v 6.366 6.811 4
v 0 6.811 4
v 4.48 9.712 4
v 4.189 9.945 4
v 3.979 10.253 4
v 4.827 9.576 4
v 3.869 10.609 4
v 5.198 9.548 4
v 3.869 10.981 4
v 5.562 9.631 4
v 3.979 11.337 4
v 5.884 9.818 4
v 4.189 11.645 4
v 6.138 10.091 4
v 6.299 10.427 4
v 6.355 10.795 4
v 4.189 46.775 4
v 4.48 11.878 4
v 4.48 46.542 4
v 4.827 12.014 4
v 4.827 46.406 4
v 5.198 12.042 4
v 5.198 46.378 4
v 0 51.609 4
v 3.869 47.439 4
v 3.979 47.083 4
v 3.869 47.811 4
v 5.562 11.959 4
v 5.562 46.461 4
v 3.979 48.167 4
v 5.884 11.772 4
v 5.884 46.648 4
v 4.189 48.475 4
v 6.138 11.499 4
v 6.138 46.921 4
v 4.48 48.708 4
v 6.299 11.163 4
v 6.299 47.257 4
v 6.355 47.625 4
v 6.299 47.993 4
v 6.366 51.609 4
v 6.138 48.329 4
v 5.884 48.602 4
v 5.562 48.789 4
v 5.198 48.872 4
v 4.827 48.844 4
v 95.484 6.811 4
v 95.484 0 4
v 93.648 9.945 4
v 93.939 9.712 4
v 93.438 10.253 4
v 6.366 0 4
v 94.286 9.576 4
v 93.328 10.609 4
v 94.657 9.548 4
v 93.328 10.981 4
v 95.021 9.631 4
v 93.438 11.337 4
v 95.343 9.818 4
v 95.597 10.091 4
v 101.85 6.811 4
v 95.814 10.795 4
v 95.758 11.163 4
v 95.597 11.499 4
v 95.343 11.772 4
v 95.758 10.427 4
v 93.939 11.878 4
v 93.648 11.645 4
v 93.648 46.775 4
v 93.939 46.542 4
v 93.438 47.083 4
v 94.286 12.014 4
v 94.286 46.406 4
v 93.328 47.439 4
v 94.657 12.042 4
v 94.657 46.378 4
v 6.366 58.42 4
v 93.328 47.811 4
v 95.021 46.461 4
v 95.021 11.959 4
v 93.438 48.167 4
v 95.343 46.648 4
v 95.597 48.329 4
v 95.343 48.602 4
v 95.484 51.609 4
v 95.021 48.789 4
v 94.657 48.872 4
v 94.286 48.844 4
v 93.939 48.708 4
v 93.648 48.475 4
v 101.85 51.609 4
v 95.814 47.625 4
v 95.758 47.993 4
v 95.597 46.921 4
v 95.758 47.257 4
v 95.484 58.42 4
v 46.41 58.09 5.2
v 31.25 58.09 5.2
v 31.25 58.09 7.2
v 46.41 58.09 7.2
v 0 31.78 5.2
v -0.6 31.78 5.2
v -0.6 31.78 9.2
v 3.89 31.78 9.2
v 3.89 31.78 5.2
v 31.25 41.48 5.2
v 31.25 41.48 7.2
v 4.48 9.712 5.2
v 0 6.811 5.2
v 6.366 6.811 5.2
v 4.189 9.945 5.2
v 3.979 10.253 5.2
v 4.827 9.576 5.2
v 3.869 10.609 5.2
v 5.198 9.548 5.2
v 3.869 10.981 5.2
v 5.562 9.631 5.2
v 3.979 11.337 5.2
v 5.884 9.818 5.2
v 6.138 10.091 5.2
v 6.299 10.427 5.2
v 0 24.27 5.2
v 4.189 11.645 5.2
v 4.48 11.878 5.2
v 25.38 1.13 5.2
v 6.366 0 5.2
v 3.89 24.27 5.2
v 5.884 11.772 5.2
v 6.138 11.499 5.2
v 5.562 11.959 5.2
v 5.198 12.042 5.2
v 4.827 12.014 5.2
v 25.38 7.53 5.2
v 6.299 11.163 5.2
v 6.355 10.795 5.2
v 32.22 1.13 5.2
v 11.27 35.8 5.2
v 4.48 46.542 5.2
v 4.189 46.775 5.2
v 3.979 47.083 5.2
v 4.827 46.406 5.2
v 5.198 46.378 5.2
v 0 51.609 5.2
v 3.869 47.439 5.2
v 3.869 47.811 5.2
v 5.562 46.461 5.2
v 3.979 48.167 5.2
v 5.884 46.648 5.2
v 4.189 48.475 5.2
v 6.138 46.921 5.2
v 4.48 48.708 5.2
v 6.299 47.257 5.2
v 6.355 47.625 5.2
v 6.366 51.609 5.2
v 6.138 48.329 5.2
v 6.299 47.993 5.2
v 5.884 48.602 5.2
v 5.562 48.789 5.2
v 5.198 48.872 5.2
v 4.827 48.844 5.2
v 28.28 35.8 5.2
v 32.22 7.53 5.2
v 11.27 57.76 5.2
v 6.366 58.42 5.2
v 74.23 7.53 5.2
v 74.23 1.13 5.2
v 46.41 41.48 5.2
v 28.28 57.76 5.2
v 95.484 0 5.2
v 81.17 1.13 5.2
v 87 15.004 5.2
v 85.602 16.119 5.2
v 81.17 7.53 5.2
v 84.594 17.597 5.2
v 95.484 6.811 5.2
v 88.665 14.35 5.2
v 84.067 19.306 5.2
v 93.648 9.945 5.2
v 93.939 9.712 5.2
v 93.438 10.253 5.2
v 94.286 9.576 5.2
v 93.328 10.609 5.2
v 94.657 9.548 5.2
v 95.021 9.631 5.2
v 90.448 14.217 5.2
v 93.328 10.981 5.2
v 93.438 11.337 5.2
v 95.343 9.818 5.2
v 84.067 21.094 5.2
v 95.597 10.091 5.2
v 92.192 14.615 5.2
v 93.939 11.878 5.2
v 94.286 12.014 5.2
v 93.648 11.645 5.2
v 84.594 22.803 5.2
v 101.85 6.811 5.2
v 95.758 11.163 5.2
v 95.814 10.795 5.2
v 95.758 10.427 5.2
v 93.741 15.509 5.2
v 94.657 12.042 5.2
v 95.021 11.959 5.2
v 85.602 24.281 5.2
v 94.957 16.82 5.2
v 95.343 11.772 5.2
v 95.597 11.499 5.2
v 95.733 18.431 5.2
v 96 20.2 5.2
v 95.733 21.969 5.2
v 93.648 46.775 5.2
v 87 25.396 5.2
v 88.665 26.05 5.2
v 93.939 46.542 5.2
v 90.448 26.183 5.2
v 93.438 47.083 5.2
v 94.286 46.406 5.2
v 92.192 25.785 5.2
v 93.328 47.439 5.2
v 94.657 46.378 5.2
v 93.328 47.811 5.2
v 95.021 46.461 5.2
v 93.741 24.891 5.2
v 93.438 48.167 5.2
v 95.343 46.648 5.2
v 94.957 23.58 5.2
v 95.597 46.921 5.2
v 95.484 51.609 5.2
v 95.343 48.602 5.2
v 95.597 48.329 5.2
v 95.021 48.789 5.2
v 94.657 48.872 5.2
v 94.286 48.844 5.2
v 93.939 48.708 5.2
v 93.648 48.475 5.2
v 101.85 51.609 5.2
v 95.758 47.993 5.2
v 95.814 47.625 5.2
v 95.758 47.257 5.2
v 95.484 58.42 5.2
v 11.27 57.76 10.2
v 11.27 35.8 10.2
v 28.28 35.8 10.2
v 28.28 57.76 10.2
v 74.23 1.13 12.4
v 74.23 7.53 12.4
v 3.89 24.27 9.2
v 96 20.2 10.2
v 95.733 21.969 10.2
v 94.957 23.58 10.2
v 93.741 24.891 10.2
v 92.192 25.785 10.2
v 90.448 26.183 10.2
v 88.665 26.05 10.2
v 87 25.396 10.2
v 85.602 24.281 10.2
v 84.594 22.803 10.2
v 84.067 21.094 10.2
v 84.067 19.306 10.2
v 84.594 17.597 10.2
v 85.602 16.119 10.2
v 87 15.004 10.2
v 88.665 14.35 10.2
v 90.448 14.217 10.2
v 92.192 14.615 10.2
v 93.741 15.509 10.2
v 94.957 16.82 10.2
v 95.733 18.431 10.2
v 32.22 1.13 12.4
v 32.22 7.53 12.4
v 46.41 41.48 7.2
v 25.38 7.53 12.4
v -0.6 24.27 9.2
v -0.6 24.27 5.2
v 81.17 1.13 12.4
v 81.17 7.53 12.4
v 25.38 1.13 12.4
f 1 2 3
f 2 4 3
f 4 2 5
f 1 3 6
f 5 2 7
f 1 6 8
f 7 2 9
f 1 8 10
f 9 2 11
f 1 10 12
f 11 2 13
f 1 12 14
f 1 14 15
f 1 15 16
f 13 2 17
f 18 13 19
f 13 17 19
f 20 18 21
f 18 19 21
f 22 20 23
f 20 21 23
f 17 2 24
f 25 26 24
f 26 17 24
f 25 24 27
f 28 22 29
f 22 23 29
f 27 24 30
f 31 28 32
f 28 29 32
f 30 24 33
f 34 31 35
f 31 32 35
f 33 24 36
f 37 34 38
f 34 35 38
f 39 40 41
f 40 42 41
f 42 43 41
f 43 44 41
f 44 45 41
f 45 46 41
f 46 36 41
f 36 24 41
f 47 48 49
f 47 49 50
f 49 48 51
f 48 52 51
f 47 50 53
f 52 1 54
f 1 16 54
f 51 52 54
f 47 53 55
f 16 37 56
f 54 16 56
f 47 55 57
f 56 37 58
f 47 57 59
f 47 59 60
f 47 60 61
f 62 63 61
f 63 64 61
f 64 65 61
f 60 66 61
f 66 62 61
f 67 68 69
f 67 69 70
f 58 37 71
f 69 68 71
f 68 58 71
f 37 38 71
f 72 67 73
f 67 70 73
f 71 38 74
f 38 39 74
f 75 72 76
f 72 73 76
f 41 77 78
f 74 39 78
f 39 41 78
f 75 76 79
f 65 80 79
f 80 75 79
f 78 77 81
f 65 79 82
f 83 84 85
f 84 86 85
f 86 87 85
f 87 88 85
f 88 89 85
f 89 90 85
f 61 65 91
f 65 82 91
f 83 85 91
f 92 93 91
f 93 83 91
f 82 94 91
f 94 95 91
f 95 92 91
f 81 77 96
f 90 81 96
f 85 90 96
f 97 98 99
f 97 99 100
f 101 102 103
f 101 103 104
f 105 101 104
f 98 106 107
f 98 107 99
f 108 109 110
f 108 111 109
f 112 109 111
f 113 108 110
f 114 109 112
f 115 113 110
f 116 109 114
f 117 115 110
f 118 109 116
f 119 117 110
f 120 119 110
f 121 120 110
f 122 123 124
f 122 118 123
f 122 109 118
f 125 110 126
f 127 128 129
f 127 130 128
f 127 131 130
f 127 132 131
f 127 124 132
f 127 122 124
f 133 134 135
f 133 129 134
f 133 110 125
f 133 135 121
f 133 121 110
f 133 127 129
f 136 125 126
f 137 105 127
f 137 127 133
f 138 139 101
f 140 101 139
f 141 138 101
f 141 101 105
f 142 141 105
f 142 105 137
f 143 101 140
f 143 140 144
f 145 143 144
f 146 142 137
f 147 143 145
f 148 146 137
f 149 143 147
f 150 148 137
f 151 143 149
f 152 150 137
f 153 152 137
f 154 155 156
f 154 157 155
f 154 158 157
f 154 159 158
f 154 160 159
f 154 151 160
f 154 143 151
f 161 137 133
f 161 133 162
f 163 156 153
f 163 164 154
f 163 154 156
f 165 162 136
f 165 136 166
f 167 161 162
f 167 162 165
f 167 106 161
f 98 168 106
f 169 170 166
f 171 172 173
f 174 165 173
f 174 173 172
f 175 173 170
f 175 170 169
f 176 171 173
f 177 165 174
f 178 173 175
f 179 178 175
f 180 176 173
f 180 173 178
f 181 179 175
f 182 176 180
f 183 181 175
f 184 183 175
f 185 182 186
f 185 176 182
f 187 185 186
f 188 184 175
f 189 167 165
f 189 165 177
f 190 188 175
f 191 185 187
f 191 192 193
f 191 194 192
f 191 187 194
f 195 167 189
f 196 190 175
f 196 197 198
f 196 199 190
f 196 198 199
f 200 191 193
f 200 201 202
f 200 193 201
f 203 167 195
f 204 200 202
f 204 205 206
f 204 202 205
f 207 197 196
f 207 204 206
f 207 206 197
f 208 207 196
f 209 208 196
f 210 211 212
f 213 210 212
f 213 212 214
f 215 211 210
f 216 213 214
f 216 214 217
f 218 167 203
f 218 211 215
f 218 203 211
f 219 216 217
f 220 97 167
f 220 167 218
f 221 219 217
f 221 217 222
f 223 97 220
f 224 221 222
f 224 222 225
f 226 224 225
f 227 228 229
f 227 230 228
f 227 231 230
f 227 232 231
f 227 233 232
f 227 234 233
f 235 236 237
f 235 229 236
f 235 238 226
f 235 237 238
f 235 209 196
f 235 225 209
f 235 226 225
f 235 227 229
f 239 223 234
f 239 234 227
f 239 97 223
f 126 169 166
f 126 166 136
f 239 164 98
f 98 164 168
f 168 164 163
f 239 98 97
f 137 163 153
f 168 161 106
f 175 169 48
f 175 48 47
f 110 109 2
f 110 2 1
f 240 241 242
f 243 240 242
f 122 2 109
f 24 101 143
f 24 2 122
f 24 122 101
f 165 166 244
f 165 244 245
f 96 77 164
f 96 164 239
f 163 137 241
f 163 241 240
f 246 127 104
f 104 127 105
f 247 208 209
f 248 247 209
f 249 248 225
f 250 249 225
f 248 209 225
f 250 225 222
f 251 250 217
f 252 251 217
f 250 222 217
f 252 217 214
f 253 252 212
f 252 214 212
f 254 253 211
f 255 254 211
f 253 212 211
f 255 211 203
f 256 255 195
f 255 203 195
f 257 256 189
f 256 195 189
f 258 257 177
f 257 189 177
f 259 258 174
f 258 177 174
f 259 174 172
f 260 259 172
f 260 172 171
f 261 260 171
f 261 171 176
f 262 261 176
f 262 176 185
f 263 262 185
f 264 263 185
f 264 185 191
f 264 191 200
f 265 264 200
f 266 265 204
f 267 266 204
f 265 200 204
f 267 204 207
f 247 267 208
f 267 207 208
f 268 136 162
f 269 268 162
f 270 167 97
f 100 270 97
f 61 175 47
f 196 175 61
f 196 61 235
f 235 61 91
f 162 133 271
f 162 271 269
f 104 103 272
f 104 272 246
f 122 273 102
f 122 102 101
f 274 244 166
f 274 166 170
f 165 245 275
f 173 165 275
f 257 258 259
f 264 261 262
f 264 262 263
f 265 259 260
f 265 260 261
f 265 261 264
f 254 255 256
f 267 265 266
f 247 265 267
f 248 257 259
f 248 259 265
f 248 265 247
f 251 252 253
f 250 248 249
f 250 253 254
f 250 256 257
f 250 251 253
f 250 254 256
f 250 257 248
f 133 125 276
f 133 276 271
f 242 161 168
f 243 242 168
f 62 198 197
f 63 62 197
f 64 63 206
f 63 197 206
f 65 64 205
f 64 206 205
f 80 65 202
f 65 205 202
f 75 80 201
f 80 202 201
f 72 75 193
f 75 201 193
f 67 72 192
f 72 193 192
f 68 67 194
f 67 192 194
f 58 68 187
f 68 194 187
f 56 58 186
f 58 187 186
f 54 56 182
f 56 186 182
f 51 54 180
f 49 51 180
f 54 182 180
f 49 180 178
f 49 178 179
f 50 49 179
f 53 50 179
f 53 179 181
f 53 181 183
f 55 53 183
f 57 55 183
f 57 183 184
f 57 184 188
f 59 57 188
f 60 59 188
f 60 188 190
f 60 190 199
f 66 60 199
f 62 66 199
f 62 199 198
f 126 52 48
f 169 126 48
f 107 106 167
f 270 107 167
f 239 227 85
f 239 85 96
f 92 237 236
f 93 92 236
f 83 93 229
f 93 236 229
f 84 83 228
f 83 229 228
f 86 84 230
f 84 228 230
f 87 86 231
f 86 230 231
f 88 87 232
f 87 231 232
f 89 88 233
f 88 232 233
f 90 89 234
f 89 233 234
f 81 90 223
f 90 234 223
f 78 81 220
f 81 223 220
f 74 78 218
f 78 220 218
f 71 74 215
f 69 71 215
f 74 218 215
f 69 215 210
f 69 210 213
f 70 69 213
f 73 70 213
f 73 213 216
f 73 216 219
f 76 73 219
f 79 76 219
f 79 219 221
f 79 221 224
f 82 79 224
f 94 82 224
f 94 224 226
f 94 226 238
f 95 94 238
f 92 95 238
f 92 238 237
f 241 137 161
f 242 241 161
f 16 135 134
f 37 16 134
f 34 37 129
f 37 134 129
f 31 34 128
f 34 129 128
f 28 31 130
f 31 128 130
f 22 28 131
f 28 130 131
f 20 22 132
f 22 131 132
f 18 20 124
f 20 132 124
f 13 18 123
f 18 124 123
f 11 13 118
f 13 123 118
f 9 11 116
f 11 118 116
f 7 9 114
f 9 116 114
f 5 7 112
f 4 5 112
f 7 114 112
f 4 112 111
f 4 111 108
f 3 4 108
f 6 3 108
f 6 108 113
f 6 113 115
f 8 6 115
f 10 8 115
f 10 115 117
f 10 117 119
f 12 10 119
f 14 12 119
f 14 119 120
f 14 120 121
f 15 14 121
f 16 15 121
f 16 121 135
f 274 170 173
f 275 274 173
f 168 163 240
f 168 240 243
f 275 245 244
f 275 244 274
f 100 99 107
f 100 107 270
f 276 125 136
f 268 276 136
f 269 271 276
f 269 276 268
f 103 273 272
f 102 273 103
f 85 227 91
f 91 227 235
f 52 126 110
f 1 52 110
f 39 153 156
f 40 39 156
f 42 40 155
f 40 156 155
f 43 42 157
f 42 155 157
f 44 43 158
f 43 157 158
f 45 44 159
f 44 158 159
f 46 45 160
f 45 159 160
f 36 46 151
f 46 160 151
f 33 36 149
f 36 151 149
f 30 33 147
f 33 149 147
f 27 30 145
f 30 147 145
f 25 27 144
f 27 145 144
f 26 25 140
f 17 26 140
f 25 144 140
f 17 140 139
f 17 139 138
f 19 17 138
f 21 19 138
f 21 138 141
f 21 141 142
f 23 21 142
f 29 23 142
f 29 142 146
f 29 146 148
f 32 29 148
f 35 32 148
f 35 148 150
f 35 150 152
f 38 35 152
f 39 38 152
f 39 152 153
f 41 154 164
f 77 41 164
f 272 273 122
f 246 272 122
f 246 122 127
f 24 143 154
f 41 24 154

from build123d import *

# Parameters (mm, degrees)
SKETCH033_W     = 101.85
SKETCH033_H     = 58.42
PAD011_DEPTH    = 1.2
SKETCH034_W     = 6.366
SKETCH034_H     = 6.811
POCKET017_DEPTH = 1.201
SKETCH035_R     = 1.25
POCKET018_DEPTH = 1.201
SKETCH036_R     = 6
PAD012_DEPTH    = 5
SKETCH037_W     = 6.84
SKETCH037_H     = 6.4
SKETCH037_W_2   = 6.94
PAD013_DEPTH    = 7.2
SKETCH039_W     = 17.01
SKETCH039_H     = 21.96
PAD014_DEPTH    = 5
SKETCH038_W     = 15.16
SKETCH038_H     = 16.61
PAD015_DEPTH    = 2
SKETCH040_W     = 4.49
SKETCH040_H     = 7.51
PAD016_DEPTH    = 4


with BuildPart() as part:
    # Sketch033 → Pad011 (new body)
    with BuildSketch(Plane.XY):
        with Locations((50.925, 29.21)):
            Rectangle(SKETCH033_W, SKETCH033_H)
    extrude(amount=PAD011_DEPTH)

    # Sketch034 (on Face6 of Pad011) → Pocket017 (cut, through all)
    with BuildSketch(Plane.XY.offset(1.2)):
        with Locations((3.183, 55.0145)):
            Rectangle(SKETCH034_W, SKETCH034_H)
        with Locations((98.667, 55.0145)):
            Rectangle(SKETCH034_W, SKETCH034_H)
        with Locations((98.667, 3.4055)):
            Rectangle(SKETCH034_W, SKETCH034_H)
        with Locations((3.183, 3.4055)):
            Rectangle(SKETCH034_W, SKETCH034_H)
    extrude(amount=-POCKET017_DEPTH, mode=Mode.SUBTRACT)

    # Sketch035 (on Face4 of Pocket017) → Pocket018 (cut, through all)
    with BuildSketch(Plane.XY.offset(1.2)):
        with Locations((5.105, 47.625)):
            Circle(SKETCH035_R)
        with Locations((94.564, 47.625)):
            Circle(SKETCH035_R)
        with Locations((94.564, 10.795)):
            Circle(SKETCH035_R)
        with Locations((5.105, 10.795)):
            Circle(SKETCH035_R)
    extrude(amount=-POCKET018_DEPTH, mode=Mode.SUBTRACT)

    # Sketch036 (on Face4 of Pocket018) → Pad012 (join)
    with BuildSketch(Plane.XY.offset(1.2)):
        with Locations((90, 20.2)):
            Circle(SKETCH036_R)
    extrude(amount=PAD012_DEPTH)

    # Sketch037 (on Face4 of Pocket018) → Pad013 (join)
    with BuildSketch(Plane.XY.offset(1.2)):
        with Locations((28.8, 4.33)):
            Rectangle(SKETCH037_W, SKETCH037_H)
        with Locations((77.7, 4.33)):
            Rectangle(SKETCH037_W_2, SKETCH037_H)
    extrude(amount=PAD013_DEPTH)

    # Sketch039 (on Face4 of Pocket018) → Pad014 (join)
    with BuildSketch(Plane.XY.offset(1.2)):
        with Locations((19.775, 46.78)):
            Rectangle(SKETCH039_W, SKETCH039_H)
    extrude(amount=PAD014_DEPTH)

    # Sketch038 (on Face4 of Pocket018) → Pad015 (join)
    with BuildSketch(Plane.XY.offset(1.2)):
        with Locations((38.83, 49.785)):
            Rectangle(SKETCH038_W, SKETCH038_H)
    extrude(amount=PAD015_DEPTH)

    # Sketch040 (on Face4 of Pad015) → Pad016 (join)
    with BuildSketch(Plane.XY.offset(1.2)):
        with Locations((1.645, 28.025)):
            Rectangle(SKETCH040_W, SKETCH040_H)
    extrude(amount=PAD016_DEPTH)


with BuildPart() as part_1:
    # Body004 placement: moved
    add(part.part.moved(Location((0, 0, 4))))


solid = part_1.part
